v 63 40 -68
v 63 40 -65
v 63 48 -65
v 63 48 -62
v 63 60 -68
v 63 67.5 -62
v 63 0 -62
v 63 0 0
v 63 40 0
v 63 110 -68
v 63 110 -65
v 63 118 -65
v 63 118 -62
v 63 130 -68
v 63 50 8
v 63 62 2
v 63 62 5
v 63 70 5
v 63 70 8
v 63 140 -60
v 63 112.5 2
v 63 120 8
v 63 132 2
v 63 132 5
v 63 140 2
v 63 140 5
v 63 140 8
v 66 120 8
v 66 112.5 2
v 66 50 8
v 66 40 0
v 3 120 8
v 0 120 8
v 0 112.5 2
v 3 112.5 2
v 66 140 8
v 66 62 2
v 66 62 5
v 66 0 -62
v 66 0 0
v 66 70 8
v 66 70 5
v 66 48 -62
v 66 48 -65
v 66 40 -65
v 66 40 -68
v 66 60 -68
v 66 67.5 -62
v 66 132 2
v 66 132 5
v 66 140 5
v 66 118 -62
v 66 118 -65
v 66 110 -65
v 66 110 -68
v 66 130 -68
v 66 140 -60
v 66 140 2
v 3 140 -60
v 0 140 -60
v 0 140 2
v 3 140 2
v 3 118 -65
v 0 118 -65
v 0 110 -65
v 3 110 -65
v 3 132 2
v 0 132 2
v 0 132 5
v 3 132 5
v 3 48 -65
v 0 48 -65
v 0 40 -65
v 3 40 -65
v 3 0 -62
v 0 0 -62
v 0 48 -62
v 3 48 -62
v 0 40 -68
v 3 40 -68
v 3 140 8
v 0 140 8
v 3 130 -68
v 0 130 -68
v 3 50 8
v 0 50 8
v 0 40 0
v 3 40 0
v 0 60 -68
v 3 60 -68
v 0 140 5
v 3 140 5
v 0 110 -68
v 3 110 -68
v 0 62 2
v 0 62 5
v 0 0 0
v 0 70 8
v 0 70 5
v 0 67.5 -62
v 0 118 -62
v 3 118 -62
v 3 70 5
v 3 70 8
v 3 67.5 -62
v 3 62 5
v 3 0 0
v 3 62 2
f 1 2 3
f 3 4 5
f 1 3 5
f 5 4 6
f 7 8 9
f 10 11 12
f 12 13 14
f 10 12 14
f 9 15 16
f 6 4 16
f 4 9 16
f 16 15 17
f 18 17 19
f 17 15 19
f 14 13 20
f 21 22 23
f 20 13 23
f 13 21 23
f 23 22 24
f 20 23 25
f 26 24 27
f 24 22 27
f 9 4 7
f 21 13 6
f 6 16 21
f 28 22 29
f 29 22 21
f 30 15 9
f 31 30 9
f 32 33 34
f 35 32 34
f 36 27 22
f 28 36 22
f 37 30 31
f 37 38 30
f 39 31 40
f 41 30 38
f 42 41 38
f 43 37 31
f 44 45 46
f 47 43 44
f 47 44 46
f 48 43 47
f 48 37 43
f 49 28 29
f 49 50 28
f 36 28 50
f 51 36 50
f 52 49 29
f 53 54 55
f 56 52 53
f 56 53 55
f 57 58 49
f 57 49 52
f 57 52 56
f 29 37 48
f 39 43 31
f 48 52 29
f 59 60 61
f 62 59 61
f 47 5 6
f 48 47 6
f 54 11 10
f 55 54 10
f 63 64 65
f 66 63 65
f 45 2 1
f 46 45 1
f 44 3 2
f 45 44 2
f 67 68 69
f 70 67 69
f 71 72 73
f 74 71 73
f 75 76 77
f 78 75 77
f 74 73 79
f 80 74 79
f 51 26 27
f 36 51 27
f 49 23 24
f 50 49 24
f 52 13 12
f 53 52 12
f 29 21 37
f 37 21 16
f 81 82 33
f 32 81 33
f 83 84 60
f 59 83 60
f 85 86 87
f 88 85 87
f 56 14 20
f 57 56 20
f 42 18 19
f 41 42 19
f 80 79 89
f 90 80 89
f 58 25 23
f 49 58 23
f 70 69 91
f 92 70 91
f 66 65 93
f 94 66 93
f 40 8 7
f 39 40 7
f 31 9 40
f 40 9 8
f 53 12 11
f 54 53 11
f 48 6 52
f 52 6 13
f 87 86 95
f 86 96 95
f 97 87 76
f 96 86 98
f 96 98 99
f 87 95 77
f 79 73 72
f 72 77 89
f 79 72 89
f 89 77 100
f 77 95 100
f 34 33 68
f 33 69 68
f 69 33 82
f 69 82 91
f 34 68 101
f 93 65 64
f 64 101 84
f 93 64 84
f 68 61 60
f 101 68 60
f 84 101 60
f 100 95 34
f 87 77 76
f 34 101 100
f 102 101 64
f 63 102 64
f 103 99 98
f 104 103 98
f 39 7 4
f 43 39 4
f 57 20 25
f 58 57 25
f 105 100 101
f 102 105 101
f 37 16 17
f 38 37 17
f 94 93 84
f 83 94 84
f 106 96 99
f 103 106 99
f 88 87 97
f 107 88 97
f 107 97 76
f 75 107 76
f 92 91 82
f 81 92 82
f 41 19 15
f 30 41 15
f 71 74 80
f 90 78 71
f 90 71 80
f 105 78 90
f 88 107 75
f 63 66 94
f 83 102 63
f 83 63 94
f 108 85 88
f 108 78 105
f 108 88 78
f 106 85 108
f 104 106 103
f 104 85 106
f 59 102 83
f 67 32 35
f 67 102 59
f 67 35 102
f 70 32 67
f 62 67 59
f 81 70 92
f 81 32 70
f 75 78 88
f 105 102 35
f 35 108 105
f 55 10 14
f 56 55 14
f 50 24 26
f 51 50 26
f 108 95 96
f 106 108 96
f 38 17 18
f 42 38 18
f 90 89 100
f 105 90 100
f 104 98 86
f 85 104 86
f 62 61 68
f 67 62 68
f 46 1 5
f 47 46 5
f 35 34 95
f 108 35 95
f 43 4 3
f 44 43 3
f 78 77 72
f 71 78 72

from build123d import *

# Parameters (mm, degrees)
EXTRUDE_1_DEPTH          = 66
CUT_EXTRUDE_1_DEPTH      = 170.870538941
CUT_EXTRUDE_1_DEPTH_BACK = 170.870538941
SKETCH_3_W               = 60
SKETCH_3_H               = 140


with BuildPart() as part:
    # 草图2 → 凸台-拉伸1 (new body)
    with BuildSketch(Plane(origin=(0, 0, 0), x_dir=(0, 0, -1), z_dir=(1, 0, 0))):
        Polygon((0, 140), (-2, 140), (-2, 132), (-5, 132), (-5, 140), (-8, 140), (-8, 120), (-2, 112.5), (-2, 70), (-2, 62), (-5, 62), (-5, 70), (-8, 70), (-8, 50), (0, 40), (0, 0), (60, 0), (62, 0), (62, 40), (62, 48), (65, 48), (65, 40), (68, 40), (68, 60), (62, 67.5), (62, 110), (62, 118), (65, 118), (65, 110), (68, 110), (68, 130), (60, 140), align=None)
    extrude(amount=EXTRUDE_1_DEPTH)

    # 草图3 → 切除-拉伸1 (cut, two sides: drawn at the far end of the back side and taken through both)
    with BuildSketch(Plane(origin=(0, 0, -62), x_dir=(-1, 0, 0), z_dir=(0, 0, -1)).offset(-CUT_EXTRUDE_1_DEPTH_BACK)):
        with Locations((-33, 70)):
            Rectangle(SKETCH_3_W, SKETCH_3_H)
    extrude(amount=CUT_EXTRUDE_1_DEPTH + CUT_EXTRUDE_1_DEPTH_BACK, mode=Mode.SUBTRACT)


with BuildPart() as cut_extrude_1_piece_1:
    # of the separate pieces the step leaves, piece 1, a body of its own (cut_extrude_1_pieces)
    add(part.part.solids().sort_by_distance((63, 140, 2))[0])


with BuildPart() as cut_extrude_1_piece_2:
    # of the separate pieces the step leaves, piece 2, a body of its own (cut_extrude_1_pieces)
    add(part.part.solids().sort_by_distance((0, 140, 2))[0])


solid = Compound([cut_extrude_1_piece_1.part, cut_extrude_1_piece_2.part])
